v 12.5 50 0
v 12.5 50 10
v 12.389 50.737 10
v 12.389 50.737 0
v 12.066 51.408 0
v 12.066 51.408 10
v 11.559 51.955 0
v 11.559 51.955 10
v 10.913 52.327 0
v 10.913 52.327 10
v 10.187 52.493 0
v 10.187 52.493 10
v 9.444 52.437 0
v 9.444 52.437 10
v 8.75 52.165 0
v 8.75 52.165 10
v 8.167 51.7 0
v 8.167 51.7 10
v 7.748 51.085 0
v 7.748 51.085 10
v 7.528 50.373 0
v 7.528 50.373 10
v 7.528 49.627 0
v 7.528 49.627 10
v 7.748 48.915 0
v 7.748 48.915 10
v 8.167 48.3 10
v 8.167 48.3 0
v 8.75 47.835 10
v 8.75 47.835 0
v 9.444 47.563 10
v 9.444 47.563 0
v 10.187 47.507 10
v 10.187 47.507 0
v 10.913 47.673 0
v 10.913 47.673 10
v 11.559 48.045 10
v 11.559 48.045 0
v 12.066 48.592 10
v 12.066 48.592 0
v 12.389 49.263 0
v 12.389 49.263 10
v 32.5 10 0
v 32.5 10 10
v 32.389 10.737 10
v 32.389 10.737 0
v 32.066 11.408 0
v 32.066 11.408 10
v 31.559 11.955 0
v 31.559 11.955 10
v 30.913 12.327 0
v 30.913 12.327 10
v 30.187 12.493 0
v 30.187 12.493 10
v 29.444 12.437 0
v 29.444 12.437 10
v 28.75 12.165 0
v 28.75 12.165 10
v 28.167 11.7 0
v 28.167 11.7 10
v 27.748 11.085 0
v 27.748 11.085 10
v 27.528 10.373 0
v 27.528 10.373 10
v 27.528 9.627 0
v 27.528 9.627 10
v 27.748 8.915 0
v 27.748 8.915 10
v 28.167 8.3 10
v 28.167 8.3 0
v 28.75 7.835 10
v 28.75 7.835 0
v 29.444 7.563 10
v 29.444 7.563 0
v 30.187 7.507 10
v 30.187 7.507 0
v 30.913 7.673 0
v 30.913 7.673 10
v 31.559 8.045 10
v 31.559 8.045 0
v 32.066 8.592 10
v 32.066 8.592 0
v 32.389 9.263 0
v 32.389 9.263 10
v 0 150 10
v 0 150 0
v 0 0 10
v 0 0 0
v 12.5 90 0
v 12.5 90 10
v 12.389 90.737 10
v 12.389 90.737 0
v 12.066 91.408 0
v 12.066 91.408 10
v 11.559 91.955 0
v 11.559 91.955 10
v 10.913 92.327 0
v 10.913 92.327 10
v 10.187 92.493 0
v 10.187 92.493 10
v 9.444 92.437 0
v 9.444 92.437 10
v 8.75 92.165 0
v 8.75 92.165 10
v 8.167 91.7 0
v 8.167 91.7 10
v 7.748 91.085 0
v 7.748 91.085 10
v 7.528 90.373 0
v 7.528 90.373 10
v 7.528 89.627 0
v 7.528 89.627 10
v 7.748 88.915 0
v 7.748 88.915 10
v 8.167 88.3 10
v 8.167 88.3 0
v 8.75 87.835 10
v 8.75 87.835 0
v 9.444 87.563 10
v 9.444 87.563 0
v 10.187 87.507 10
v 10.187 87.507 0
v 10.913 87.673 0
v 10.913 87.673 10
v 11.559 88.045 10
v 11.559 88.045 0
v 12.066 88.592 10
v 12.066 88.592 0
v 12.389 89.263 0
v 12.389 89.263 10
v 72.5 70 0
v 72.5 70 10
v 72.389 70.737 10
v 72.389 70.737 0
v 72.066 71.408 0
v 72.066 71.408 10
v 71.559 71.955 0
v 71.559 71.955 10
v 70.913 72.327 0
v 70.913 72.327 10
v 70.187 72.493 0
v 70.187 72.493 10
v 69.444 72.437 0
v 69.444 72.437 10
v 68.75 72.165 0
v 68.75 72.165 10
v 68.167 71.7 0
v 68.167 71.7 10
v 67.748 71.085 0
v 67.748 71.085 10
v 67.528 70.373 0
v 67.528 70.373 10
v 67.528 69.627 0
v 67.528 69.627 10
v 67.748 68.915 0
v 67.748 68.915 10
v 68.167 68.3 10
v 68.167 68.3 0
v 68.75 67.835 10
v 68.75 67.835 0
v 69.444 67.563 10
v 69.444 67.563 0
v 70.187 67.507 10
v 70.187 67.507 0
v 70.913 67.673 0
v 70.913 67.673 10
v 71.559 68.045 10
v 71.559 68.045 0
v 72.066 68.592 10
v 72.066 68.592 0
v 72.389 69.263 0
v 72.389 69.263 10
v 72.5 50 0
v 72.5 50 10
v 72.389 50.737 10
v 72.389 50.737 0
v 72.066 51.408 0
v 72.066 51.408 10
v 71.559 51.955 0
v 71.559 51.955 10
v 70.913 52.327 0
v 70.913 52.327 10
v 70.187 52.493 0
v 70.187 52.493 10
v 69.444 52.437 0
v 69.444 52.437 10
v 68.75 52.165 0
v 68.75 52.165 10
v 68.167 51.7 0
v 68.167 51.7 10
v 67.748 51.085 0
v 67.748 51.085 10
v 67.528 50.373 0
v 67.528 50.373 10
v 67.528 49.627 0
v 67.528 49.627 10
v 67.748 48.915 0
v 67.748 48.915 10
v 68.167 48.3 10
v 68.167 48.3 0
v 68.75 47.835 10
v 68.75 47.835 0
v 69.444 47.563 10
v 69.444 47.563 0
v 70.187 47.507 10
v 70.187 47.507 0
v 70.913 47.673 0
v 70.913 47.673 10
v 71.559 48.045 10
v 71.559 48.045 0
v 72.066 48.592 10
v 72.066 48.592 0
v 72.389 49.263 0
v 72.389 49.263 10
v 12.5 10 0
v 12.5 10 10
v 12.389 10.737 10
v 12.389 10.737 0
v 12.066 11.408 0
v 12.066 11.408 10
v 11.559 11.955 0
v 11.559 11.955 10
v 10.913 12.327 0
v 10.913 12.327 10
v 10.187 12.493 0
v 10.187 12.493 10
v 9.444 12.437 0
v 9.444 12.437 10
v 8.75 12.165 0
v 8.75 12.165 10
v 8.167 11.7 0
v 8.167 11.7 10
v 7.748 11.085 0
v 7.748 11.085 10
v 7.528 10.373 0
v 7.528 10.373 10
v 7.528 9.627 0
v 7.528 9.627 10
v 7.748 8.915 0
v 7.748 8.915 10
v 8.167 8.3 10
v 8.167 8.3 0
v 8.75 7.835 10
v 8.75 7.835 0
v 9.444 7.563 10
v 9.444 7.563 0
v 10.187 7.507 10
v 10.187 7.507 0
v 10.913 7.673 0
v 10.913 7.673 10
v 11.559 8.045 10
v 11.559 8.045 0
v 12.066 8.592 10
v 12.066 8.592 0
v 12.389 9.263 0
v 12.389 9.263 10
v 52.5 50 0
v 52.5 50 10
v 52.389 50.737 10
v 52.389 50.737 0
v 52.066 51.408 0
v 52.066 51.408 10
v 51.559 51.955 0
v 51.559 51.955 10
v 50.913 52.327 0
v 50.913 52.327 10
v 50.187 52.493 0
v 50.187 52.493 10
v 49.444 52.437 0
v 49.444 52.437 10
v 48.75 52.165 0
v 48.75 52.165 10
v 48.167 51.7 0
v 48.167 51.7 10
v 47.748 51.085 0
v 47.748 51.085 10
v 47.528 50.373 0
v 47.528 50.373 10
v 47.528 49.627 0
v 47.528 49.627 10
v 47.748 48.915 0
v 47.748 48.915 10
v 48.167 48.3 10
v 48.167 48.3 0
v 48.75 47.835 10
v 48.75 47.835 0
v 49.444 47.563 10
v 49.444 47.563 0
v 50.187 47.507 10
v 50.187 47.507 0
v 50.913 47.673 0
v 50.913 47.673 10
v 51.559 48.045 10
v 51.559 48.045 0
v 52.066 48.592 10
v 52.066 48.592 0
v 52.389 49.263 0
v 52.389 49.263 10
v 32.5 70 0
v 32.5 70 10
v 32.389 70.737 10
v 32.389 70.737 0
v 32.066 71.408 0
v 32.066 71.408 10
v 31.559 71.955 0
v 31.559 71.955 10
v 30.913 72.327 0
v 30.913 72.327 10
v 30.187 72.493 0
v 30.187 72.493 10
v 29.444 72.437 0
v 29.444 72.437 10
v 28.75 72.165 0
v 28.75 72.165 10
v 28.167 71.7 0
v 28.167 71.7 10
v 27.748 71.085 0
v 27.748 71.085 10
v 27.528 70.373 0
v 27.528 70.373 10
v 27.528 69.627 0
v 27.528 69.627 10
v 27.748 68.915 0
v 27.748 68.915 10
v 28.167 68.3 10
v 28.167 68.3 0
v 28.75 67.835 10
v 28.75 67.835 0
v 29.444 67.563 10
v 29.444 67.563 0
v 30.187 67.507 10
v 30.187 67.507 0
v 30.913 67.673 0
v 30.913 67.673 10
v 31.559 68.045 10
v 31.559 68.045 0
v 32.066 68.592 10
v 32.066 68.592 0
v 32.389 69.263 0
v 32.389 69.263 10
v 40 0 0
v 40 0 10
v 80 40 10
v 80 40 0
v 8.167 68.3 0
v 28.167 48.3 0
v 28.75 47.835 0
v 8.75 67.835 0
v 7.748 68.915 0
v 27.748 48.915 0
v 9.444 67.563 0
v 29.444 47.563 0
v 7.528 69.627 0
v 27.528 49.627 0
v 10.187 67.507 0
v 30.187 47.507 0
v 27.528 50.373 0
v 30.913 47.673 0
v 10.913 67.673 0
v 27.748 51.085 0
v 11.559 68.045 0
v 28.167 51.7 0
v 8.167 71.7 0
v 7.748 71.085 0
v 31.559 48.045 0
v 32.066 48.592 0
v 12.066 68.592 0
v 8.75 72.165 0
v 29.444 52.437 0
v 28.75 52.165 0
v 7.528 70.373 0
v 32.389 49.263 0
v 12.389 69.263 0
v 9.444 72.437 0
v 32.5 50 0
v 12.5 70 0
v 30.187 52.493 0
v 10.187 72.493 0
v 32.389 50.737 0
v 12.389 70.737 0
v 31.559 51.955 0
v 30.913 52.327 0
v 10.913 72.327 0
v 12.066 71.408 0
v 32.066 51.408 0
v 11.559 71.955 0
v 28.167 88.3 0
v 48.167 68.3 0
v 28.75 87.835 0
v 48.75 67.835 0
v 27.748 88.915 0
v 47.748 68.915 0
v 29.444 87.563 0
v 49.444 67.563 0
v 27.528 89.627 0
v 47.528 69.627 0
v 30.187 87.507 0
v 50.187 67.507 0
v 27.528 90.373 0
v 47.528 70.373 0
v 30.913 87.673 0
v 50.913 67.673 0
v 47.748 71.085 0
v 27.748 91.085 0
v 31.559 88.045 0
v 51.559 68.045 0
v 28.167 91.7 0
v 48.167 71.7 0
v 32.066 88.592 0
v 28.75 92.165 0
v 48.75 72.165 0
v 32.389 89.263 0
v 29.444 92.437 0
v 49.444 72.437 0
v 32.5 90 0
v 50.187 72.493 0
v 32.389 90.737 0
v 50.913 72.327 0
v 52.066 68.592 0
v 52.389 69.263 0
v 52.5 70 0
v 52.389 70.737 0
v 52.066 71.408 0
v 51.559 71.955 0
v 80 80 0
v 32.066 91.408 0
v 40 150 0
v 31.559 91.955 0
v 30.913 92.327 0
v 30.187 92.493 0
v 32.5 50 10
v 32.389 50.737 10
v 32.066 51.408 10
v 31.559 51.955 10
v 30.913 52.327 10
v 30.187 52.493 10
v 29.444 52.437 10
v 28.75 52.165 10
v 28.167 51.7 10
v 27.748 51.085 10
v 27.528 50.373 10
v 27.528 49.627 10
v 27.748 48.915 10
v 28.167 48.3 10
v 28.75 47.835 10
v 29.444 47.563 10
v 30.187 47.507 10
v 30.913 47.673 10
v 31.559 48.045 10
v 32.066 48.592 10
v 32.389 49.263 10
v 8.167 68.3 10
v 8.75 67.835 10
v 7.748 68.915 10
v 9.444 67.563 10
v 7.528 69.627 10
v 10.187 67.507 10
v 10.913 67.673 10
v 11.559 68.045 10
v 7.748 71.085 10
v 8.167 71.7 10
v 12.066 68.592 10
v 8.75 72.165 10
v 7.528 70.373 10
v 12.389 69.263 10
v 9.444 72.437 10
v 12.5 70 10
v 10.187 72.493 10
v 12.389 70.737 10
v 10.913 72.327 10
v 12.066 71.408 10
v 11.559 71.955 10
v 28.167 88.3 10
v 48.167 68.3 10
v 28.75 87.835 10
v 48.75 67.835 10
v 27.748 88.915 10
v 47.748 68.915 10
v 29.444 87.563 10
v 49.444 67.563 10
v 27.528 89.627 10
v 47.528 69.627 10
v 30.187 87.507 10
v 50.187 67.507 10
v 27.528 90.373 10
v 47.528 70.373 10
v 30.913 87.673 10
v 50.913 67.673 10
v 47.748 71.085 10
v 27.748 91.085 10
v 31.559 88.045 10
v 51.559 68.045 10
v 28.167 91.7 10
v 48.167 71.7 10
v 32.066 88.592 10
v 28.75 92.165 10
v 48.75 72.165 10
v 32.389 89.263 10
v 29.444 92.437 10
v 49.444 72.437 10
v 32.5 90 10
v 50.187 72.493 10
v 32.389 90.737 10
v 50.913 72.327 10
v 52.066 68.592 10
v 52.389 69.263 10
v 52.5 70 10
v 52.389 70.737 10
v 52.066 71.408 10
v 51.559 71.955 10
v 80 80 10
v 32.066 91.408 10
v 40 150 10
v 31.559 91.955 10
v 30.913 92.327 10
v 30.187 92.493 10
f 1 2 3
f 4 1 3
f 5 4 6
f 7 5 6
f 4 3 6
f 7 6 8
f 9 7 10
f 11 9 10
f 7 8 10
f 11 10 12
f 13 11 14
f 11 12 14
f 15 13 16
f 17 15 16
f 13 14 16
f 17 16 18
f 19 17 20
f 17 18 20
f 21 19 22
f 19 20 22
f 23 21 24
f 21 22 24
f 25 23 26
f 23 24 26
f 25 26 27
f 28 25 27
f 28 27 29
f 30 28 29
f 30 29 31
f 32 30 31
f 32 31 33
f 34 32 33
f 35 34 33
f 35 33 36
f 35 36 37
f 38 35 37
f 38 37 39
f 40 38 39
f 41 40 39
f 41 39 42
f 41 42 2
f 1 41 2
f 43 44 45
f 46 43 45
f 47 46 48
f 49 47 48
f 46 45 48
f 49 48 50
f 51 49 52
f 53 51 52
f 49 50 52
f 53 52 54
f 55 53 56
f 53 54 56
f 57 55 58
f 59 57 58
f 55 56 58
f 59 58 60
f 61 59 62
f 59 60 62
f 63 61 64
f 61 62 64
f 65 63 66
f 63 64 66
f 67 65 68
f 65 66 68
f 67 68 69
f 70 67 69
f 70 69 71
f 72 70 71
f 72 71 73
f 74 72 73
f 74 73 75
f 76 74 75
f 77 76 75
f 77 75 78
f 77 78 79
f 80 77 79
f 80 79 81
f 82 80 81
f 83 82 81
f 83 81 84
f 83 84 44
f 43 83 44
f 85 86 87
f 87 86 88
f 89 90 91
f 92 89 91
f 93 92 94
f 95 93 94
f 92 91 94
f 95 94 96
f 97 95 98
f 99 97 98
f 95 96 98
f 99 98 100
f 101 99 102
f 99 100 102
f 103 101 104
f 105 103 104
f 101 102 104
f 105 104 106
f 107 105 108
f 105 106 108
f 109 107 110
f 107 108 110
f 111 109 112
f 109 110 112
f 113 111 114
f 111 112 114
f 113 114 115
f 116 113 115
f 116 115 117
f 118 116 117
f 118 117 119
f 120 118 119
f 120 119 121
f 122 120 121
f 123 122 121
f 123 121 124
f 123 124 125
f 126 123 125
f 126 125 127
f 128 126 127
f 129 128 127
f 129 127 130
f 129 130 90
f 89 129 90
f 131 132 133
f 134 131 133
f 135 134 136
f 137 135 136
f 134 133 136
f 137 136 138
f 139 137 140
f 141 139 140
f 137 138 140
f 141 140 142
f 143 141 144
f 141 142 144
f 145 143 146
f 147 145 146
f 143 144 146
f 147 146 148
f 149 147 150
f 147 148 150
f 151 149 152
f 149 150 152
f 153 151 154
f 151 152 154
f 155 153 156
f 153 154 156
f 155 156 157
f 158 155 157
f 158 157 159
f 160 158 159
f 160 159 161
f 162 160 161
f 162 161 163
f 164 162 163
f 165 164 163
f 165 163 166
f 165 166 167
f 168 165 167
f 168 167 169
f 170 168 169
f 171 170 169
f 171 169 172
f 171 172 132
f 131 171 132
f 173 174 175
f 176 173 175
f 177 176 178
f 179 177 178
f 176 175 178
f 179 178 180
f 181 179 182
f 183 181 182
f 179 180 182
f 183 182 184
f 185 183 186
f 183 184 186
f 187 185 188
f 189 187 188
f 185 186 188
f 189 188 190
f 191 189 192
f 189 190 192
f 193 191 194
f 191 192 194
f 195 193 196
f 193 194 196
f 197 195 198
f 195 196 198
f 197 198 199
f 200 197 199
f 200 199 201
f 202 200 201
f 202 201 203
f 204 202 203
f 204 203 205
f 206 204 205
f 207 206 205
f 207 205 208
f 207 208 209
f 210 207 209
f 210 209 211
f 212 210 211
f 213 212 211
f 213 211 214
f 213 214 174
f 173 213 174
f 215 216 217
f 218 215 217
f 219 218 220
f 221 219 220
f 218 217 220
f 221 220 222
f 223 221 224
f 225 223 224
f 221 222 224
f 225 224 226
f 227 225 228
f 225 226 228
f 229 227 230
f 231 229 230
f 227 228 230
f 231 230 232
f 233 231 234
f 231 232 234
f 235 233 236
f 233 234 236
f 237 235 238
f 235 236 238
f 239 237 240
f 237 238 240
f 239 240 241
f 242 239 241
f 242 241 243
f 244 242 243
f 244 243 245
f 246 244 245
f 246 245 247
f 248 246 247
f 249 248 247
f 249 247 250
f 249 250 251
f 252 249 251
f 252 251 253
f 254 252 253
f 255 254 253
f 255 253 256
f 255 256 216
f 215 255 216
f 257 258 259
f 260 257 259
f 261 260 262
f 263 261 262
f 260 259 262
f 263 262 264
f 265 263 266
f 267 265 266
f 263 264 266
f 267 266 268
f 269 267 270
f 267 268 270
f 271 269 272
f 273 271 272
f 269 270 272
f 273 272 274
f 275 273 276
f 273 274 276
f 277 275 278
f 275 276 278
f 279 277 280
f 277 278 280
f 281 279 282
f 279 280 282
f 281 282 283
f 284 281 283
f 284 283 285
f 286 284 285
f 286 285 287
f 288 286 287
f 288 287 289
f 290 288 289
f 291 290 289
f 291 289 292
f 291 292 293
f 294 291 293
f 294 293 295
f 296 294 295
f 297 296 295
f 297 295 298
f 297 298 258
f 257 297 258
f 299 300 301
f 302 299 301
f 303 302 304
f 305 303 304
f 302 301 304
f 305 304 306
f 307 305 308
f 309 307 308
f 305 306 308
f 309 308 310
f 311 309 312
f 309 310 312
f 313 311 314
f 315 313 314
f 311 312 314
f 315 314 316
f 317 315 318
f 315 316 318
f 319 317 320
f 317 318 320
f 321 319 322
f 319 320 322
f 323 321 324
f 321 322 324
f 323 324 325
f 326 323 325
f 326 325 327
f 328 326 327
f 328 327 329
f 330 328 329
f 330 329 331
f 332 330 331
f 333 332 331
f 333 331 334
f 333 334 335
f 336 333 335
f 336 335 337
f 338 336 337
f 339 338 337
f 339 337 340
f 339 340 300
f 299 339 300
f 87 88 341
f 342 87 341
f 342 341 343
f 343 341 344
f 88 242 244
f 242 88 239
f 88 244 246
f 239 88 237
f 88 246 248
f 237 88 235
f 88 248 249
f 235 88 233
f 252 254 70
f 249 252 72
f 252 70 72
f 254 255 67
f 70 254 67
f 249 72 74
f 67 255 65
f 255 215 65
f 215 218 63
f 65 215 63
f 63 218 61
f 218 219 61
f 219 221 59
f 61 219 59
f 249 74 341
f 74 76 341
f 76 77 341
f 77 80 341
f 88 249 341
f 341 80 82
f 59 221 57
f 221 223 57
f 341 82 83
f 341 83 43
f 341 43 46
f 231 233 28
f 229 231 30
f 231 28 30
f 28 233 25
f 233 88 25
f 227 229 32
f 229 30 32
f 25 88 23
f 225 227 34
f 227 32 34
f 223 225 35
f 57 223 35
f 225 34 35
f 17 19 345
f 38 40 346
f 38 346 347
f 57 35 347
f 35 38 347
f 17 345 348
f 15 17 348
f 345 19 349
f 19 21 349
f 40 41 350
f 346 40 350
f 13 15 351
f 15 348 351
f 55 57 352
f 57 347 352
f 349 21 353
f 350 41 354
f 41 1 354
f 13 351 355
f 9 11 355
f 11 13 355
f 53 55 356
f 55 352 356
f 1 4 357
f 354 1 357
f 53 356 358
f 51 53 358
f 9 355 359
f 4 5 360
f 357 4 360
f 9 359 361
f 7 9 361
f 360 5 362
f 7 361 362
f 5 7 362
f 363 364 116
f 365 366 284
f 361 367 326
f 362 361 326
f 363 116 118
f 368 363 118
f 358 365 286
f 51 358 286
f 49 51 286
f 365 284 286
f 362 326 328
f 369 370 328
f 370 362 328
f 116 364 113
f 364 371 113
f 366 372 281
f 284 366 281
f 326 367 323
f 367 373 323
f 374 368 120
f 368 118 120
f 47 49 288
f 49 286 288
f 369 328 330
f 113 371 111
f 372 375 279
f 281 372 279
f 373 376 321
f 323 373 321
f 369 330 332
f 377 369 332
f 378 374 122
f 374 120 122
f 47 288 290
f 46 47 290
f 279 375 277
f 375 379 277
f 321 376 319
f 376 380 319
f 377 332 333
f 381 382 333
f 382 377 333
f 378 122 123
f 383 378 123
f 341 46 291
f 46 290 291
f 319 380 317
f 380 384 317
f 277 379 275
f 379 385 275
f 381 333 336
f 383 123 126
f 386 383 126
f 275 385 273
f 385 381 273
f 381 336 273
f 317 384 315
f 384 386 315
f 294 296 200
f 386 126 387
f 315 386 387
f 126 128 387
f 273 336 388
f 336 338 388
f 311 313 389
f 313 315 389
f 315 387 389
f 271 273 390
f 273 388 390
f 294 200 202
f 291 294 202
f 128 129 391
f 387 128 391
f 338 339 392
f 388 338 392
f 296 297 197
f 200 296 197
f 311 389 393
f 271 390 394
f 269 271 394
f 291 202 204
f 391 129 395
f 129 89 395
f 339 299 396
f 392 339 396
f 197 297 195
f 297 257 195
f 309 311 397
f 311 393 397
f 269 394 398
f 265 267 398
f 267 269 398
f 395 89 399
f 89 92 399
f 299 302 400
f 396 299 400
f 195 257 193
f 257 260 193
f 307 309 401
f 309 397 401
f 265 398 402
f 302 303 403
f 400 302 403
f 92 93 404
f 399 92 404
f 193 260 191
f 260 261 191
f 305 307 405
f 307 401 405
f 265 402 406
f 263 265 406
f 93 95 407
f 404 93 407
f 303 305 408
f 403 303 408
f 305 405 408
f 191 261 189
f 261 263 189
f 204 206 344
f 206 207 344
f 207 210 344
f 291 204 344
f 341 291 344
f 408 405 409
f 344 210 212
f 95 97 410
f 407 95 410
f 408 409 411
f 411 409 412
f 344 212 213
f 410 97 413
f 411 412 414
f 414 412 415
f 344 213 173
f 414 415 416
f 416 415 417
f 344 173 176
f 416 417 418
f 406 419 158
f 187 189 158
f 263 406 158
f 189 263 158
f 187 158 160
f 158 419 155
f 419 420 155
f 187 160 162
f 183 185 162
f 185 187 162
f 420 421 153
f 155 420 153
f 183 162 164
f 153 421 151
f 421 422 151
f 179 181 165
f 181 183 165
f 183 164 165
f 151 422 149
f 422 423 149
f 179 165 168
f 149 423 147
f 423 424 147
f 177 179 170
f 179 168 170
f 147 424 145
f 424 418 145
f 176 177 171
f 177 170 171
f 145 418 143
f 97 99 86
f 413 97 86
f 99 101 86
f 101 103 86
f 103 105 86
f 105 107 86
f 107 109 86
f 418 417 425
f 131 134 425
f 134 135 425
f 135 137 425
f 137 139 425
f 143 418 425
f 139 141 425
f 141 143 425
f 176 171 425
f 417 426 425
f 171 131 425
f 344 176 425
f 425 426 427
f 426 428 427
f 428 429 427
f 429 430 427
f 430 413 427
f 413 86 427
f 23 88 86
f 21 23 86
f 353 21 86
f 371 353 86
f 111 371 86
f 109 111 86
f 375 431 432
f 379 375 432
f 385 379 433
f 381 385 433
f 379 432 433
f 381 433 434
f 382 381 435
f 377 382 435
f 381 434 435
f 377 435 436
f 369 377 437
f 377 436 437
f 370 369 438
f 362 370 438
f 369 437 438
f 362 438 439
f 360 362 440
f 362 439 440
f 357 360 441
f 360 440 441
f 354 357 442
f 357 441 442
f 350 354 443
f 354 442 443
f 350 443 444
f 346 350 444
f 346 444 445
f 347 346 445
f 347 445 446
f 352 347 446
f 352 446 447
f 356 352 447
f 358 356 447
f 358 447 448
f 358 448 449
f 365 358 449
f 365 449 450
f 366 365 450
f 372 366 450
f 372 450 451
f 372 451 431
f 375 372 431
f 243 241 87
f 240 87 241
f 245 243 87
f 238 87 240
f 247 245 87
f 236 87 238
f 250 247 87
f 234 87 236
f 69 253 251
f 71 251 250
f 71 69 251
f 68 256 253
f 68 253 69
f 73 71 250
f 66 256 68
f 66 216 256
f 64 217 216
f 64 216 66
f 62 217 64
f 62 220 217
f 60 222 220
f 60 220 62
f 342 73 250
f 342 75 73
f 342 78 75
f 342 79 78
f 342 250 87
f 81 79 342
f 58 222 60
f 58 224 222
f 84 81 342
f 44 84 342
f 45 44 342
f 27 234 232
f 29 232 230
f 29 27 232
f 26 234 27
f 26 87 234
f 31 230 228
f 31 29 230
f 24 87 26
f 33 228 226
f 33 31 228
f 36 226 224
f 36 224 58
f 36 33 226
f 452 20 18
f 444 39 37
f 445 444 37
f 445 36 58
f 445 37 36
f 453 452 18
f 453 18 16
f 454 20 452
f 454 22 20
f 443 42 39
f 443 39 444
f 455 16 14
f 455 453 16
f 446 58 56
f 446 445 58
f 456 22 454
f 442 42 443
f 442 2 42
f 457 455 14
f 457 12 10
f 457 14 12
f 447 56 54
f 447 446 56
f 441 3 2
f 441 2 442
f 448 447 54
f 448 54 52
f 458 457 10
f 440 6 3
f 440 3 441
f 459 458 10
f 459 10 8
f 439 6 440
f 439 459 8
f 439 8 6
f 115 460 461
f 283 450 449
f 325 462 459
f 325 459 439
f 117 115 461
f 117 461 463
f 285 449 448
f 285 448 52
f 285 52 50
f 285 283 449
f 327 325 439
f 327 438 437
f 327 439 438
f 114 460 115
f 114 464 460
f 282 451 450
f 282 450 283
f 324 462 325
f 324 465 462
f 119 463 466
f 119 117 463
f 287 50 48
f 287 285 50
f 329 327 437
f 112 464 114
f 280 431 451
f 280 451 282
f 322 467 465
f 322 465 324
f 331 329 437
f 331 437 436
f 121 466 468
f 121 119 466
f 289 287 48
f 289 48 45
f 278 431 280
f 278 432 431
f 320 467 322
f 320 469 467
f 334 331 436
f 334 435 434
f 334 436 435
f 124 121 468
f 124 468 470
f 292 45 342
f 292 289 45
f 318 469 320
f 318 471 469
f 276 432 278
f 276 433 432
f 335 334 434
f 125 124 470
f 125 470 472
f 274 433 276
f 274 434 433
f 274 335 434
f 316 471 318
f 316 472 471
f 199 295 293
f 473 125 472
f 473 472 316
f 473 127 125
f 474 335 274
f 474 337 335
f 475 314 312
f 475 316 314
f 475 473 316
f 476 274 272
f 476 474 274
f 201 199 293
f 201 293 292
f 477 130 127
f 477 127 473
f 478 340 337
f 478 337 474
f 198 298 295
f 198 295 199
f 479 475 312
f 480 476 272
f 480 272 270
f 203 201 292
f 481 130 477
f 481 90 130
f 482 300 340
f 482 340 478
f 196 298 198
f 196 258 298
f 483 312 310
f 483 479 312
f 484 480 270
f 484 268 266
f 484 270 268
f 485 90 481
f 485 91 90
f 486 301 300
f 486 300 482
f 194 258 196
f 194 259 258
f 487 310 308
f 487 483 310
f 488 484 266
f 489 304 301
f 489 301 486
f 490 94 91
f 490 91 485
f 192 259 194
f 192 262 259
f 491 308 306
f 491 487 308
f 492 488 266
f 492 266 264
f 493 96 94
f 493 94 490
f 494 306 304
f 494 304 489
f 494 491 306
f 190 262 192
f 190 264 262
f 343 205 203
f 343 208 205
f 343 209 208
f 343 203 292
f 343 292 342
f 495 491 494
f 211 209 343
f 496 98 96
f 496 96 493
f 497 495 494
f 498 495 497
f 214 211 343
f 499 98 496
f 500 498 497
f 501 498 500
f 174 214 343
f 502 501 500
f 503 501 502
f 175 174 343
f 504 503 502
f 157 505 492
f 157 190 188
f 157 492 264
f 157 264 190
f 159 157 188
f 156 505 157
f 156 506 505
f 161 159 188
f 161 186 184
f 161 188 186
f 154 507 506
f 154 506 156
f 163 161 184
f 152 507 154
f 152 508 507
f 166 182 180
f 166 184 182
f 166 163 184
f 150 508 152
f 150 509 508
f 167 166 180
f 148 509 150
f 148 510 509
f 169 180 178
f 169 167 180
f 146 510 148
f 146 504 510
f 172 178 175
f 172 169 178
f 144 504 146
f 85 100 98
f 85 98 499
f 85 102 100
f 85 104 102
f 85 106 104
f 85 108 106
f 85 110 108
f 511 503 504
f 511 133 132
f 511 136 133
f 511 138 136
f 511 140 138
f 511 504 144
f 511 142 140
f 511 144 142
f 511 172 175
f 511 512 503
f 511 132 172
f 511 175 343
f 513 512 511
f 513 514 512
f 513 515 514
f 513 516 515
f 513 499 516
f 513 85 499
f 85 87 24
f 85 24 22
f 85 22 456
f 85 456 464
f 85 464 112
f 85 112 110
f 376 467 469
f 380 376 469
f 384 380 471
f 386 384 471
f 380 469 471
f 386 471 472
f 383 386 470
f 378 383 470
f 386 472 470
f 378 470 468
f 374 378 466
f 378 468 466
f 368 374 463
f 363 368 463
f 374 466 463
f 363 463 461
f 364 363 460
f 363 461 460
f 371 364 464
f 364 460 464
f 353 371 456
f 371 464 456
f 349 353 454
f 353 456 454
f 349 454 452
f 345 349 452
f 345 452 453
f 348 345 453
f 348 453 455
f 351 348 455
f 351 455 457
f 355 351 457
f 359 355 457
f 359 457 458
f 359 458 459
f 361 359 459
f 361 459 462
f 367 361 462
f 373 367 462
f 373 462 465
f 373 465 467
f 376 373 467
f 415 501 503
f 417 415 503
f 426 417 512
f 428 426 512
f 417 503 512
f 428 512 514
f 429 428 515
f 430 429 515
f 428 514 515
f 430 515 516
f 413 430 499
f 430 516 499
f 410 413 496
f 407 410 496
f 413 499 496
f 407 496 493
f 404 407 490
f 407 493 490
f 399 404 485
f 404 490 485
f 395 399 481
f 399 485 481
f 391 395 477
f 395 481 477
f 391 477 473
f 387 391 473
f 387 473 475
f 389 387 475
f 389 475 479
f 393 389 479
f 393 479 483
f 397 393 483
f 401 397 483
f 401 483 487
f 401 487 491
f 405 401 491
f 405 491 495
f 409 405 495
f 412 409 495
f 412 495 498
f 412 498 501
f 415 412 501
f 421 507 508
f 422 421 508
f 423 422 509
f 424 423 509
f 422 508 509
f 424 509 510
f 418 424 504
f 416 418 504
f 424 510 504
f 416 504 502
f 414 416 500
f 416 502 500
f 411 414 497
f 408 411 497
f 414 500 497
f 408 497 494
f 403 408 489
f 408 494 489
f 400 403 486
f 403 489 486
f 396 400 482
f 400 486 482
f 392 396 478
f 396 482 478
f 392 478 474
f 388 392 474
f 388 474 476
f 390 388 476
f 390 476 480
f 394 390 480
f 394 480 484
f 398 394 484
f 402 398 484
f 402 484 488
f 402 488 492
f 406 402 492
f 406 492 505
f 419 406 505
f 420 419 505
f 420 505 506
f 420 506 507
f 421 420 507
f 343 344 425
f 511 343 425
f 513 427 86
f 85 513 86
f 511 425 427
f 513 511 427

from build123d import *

# Parameters (mm, degrees)
BOSS_EXTRUDE1_DEPTH = 10
CUT_EXTRUDE1_REACH  = 172.294
SKETCH2_R           = 2.5


with BuildPart() as part:
    # Sketch1 → Boss-Extrude1 (new body)
    with BuildSketch(Plane.XY):
        Polygon((0, 0), (40, 0), (80, 40), (80, 80), (40, 150), (0, 150), align=None)
    extrude(amount=BOSS_EXTRUDE1_DEPTH)

    # Sketch2 → Cut-Extrude1 (cut, up to next)
    with BuildSketch(Plane.XY.offset(10), mode=Mode.PRIVATE) as cut_extrude1_sk1:
        with Locations((10, 10)):
            Circle(SKETCH2_R)
    cut_extrude1_tool1 = extrude(cut_extrude1_sk1.sketch, amount=-CUT_EXTRUDE1_REACH, mode=Mode.PRIVATE) & part.part
    # Sketch2 → Cut-Extrude1 (cut, up to next)
    with BuildSketch(Plane.XY.offset(10), mode=Mode.PRIVATE) as cut_extrude1_sk2:
        with Locations((30, 10)):
            Circle(SKETCH2_R)
    cut_extrude1_tool2 = extrude(cut_extrude1_sk2.sketch, amount=-CUT_EXTRUDE1_REACH, mode=Mode.PRIVATE) & part.part
    # Sketch2 → Cut-Extrude1 (cut, up to next)
    with BuildSketch(Plane.XY.offset(10), mode=Mode.PRIVATE) as cut_extrude1_sk3:
        with Locations((10, 50)):
            Circle(SKETCH2_R)
    cut_extrude1_tool3 = extrude(cut_extrude1_sk3.sketch, amount=-CUT_EXTRUDE1_REACH, mode=Mode.PRIVATE) & part.part
    # Sketch2 → Cut-Extrude1 (cut, up to next)
    with BuildSketch(Plane.XY.offset(10), mode=Mode.PRIVATE) as cut_extrude1_sk4:
        with Locations((70, 70)):
            Circle(SKETCH2_R)
    cut_extrude1_tool4 = extrude(cut_extrude1_sk4.sketch, amount=-CUT_EXTRUDE1_REACH, mode=Mode.PRIVATE) & part.part
    # Sketch2 → Cut-Extrude1 (cut, up to next)
    with BuildSketch(Plane.XY.offset(10), mode=Mode.PRIVATE) as cut_extrude1_sk5:
        with Locations((50, 70)):
            Circle(SKETCH2_R)
    cut_extrude1_tool5 = extrude(cut_extrude1_sk5.sketch, amount=-CUT_EXTRUDE1_REACH, mode=Mode.PRIVATE) & part.part
    # Sketch2 → Cut-Extrude1 (cut, up to next)
    with BuildSketch(Plane.XY.offset(10), mode=Mode.PRIVATE) as cut_extrude1_sk6:
        with Locations((50, 50)):
            Circle(SKETCH2_R)
    cut_extrude1_tool6 = extrude(cut_extrude1_sk6.sketch, amount=-CUT_EXTRUDE1_REACH, mode=Mode.PRIVATE) & part.part
    # Sketch2 → Cut-Extrude1 (cut, up to next)
    with BuildSketch(Plane.XY.offset(10), mode=Mode.PRIVATE) as cut_extrude1_sk7:
        with Locations((30, 50)):
            Circle(SKETCH2_R)
    cut_extrude1_tool7 = extrude(cut_extrude1_sk7.sketch, amount=-CUT_EXTRUDE1_REACH, mode=Mode.PRIVATE) & part.part
    # Sketch2 → Cut-Extrude1 (cut, up to next)
    with BuildSketch(Plane.XY.offset(10), mode=Mode.PRIVATE) as cut_extrude1_sk8:
        with Locations((70, 50)):
            Circle(SKETCH2_R)
    cut_extrude1_tool8 = extrude(cut_extrude1_sk8.sketch, amount=-CUT_EXTRUDE1_REACH, mode=Mode.PRIVATE) & part.part
    # Sketch2 → Cut-Extrude1 (cut, up to next)
    with BuildSketch(Plane.XY.offset(10), mode=Mode.PRIVATE) as cut_extrude1_sk9:
        with Locations((30, 90)):
            Circle(SKETCH2_R)
    cut_extrude1_tool9 = extrude(cut_extrude1_sk9.sketch, amount=-CUT_EXTRUDE1_REACH, mode=Mode.PRIVATE) & part.part
    # Sketch2 → Cut-Extrude1 (cut, up to next)
    with BuildSketch(Plane.XY.offset(10), mode=Mode.PRIVATE) as cut_extrude1_sk10:
        with Locations((10, 90)):
            Circle(SKETCH2_R)
    cut_extrude1_tool10 = extrude(cut_extrude1_sk10.sketch, amount=-CUT_EXTRUDE1_REACH, mode=Mode.PRIVATE) & part.part
    # Sketch2 → Cut-Extrude1 (cut, up to next)
    with BuildSketch(Plane.XY.offset(10), mode=Mode.PRIVATE) as cut_extrude1_sk11:
        with Locations((10, 70)):
            Circle(SKETCH2_R)
    cut_extrude1_tool11 = extrude(cut_extrude1_sk11.sketch, amount=-CUT_EXTRUDE1_REACH, mode=Mode.PRIVATE) & part.part
    # Sketch2 → Cut-Extrude1 (cut, up to next)
    with BuildSketch(Plane.XY.offset(10), mode=Mode.PRIVATE) as cut_extrude1_sk12:
        with Locations((30, 70)):
            Circle(SKETCH2_R)
    cut_extrude1_tool12 = extrude(cut_extrude1_sk12.sketch, amount=-CUT_EXTRUDE1_REACH, mode=Mode.PRIVATE) & part.part
    add(cut_extrude1_tool1.solids().sort_by_distance((10, 10, 10))[0], mode=Mode.SUBTRACT)
    add(cut_extrude1_tool2.solids().sort_by_distance((30, 10, 10))[0], mode=Mode.SUBTRACT)
    add(cut_extrude1_tool3.solids().sort_by_distance((10, 50, 10))[0], mode=Mode.SUBTRACT)
    add(cut_extrude1_tool4.solids().sort_by_distance((70, 70, 10))[0], mode=Mode.SUBTRACT)
    add(cut_extrude1_tool5.solids().sort_by_distance((50, 70, 10))[0], mode=Mode.SUBTRACT)
    add(cut_extrude1_tool6.solids().sort_by_distance((50, 50, 10))[0], mode=Mode.SUBTRACT)
    add(cut_extrude1_tool7.solids().sort_by_distance((30, 50, 10))[0], mode=Mode.SUBTRACT)
    add(cut_extrude1_tool8.solids().sort_by_distance((70, 50, 10))[0], mode=Mode.SUBTRACT)
    add(cut_extrude1_tool9.solids().sort_by_distance((30, 90, 10))[0], mode=Mode.SUBTRACT)
    add(cut_extrude1_tool10.solids().sort_by_distance((10, 90, 10))[0], mode=Mode.SUBTRACT)
    add(cut_extrude1_tool11.solids().sort_by_distance((10, 70, 10))[0], mode=Mode.SUBTRACT)
    add(cut_extrude1_tool12.solids().sort_by_distance((30, 70, 10))[0], mode=Mode.SUBTRACT)


solid = part.part
